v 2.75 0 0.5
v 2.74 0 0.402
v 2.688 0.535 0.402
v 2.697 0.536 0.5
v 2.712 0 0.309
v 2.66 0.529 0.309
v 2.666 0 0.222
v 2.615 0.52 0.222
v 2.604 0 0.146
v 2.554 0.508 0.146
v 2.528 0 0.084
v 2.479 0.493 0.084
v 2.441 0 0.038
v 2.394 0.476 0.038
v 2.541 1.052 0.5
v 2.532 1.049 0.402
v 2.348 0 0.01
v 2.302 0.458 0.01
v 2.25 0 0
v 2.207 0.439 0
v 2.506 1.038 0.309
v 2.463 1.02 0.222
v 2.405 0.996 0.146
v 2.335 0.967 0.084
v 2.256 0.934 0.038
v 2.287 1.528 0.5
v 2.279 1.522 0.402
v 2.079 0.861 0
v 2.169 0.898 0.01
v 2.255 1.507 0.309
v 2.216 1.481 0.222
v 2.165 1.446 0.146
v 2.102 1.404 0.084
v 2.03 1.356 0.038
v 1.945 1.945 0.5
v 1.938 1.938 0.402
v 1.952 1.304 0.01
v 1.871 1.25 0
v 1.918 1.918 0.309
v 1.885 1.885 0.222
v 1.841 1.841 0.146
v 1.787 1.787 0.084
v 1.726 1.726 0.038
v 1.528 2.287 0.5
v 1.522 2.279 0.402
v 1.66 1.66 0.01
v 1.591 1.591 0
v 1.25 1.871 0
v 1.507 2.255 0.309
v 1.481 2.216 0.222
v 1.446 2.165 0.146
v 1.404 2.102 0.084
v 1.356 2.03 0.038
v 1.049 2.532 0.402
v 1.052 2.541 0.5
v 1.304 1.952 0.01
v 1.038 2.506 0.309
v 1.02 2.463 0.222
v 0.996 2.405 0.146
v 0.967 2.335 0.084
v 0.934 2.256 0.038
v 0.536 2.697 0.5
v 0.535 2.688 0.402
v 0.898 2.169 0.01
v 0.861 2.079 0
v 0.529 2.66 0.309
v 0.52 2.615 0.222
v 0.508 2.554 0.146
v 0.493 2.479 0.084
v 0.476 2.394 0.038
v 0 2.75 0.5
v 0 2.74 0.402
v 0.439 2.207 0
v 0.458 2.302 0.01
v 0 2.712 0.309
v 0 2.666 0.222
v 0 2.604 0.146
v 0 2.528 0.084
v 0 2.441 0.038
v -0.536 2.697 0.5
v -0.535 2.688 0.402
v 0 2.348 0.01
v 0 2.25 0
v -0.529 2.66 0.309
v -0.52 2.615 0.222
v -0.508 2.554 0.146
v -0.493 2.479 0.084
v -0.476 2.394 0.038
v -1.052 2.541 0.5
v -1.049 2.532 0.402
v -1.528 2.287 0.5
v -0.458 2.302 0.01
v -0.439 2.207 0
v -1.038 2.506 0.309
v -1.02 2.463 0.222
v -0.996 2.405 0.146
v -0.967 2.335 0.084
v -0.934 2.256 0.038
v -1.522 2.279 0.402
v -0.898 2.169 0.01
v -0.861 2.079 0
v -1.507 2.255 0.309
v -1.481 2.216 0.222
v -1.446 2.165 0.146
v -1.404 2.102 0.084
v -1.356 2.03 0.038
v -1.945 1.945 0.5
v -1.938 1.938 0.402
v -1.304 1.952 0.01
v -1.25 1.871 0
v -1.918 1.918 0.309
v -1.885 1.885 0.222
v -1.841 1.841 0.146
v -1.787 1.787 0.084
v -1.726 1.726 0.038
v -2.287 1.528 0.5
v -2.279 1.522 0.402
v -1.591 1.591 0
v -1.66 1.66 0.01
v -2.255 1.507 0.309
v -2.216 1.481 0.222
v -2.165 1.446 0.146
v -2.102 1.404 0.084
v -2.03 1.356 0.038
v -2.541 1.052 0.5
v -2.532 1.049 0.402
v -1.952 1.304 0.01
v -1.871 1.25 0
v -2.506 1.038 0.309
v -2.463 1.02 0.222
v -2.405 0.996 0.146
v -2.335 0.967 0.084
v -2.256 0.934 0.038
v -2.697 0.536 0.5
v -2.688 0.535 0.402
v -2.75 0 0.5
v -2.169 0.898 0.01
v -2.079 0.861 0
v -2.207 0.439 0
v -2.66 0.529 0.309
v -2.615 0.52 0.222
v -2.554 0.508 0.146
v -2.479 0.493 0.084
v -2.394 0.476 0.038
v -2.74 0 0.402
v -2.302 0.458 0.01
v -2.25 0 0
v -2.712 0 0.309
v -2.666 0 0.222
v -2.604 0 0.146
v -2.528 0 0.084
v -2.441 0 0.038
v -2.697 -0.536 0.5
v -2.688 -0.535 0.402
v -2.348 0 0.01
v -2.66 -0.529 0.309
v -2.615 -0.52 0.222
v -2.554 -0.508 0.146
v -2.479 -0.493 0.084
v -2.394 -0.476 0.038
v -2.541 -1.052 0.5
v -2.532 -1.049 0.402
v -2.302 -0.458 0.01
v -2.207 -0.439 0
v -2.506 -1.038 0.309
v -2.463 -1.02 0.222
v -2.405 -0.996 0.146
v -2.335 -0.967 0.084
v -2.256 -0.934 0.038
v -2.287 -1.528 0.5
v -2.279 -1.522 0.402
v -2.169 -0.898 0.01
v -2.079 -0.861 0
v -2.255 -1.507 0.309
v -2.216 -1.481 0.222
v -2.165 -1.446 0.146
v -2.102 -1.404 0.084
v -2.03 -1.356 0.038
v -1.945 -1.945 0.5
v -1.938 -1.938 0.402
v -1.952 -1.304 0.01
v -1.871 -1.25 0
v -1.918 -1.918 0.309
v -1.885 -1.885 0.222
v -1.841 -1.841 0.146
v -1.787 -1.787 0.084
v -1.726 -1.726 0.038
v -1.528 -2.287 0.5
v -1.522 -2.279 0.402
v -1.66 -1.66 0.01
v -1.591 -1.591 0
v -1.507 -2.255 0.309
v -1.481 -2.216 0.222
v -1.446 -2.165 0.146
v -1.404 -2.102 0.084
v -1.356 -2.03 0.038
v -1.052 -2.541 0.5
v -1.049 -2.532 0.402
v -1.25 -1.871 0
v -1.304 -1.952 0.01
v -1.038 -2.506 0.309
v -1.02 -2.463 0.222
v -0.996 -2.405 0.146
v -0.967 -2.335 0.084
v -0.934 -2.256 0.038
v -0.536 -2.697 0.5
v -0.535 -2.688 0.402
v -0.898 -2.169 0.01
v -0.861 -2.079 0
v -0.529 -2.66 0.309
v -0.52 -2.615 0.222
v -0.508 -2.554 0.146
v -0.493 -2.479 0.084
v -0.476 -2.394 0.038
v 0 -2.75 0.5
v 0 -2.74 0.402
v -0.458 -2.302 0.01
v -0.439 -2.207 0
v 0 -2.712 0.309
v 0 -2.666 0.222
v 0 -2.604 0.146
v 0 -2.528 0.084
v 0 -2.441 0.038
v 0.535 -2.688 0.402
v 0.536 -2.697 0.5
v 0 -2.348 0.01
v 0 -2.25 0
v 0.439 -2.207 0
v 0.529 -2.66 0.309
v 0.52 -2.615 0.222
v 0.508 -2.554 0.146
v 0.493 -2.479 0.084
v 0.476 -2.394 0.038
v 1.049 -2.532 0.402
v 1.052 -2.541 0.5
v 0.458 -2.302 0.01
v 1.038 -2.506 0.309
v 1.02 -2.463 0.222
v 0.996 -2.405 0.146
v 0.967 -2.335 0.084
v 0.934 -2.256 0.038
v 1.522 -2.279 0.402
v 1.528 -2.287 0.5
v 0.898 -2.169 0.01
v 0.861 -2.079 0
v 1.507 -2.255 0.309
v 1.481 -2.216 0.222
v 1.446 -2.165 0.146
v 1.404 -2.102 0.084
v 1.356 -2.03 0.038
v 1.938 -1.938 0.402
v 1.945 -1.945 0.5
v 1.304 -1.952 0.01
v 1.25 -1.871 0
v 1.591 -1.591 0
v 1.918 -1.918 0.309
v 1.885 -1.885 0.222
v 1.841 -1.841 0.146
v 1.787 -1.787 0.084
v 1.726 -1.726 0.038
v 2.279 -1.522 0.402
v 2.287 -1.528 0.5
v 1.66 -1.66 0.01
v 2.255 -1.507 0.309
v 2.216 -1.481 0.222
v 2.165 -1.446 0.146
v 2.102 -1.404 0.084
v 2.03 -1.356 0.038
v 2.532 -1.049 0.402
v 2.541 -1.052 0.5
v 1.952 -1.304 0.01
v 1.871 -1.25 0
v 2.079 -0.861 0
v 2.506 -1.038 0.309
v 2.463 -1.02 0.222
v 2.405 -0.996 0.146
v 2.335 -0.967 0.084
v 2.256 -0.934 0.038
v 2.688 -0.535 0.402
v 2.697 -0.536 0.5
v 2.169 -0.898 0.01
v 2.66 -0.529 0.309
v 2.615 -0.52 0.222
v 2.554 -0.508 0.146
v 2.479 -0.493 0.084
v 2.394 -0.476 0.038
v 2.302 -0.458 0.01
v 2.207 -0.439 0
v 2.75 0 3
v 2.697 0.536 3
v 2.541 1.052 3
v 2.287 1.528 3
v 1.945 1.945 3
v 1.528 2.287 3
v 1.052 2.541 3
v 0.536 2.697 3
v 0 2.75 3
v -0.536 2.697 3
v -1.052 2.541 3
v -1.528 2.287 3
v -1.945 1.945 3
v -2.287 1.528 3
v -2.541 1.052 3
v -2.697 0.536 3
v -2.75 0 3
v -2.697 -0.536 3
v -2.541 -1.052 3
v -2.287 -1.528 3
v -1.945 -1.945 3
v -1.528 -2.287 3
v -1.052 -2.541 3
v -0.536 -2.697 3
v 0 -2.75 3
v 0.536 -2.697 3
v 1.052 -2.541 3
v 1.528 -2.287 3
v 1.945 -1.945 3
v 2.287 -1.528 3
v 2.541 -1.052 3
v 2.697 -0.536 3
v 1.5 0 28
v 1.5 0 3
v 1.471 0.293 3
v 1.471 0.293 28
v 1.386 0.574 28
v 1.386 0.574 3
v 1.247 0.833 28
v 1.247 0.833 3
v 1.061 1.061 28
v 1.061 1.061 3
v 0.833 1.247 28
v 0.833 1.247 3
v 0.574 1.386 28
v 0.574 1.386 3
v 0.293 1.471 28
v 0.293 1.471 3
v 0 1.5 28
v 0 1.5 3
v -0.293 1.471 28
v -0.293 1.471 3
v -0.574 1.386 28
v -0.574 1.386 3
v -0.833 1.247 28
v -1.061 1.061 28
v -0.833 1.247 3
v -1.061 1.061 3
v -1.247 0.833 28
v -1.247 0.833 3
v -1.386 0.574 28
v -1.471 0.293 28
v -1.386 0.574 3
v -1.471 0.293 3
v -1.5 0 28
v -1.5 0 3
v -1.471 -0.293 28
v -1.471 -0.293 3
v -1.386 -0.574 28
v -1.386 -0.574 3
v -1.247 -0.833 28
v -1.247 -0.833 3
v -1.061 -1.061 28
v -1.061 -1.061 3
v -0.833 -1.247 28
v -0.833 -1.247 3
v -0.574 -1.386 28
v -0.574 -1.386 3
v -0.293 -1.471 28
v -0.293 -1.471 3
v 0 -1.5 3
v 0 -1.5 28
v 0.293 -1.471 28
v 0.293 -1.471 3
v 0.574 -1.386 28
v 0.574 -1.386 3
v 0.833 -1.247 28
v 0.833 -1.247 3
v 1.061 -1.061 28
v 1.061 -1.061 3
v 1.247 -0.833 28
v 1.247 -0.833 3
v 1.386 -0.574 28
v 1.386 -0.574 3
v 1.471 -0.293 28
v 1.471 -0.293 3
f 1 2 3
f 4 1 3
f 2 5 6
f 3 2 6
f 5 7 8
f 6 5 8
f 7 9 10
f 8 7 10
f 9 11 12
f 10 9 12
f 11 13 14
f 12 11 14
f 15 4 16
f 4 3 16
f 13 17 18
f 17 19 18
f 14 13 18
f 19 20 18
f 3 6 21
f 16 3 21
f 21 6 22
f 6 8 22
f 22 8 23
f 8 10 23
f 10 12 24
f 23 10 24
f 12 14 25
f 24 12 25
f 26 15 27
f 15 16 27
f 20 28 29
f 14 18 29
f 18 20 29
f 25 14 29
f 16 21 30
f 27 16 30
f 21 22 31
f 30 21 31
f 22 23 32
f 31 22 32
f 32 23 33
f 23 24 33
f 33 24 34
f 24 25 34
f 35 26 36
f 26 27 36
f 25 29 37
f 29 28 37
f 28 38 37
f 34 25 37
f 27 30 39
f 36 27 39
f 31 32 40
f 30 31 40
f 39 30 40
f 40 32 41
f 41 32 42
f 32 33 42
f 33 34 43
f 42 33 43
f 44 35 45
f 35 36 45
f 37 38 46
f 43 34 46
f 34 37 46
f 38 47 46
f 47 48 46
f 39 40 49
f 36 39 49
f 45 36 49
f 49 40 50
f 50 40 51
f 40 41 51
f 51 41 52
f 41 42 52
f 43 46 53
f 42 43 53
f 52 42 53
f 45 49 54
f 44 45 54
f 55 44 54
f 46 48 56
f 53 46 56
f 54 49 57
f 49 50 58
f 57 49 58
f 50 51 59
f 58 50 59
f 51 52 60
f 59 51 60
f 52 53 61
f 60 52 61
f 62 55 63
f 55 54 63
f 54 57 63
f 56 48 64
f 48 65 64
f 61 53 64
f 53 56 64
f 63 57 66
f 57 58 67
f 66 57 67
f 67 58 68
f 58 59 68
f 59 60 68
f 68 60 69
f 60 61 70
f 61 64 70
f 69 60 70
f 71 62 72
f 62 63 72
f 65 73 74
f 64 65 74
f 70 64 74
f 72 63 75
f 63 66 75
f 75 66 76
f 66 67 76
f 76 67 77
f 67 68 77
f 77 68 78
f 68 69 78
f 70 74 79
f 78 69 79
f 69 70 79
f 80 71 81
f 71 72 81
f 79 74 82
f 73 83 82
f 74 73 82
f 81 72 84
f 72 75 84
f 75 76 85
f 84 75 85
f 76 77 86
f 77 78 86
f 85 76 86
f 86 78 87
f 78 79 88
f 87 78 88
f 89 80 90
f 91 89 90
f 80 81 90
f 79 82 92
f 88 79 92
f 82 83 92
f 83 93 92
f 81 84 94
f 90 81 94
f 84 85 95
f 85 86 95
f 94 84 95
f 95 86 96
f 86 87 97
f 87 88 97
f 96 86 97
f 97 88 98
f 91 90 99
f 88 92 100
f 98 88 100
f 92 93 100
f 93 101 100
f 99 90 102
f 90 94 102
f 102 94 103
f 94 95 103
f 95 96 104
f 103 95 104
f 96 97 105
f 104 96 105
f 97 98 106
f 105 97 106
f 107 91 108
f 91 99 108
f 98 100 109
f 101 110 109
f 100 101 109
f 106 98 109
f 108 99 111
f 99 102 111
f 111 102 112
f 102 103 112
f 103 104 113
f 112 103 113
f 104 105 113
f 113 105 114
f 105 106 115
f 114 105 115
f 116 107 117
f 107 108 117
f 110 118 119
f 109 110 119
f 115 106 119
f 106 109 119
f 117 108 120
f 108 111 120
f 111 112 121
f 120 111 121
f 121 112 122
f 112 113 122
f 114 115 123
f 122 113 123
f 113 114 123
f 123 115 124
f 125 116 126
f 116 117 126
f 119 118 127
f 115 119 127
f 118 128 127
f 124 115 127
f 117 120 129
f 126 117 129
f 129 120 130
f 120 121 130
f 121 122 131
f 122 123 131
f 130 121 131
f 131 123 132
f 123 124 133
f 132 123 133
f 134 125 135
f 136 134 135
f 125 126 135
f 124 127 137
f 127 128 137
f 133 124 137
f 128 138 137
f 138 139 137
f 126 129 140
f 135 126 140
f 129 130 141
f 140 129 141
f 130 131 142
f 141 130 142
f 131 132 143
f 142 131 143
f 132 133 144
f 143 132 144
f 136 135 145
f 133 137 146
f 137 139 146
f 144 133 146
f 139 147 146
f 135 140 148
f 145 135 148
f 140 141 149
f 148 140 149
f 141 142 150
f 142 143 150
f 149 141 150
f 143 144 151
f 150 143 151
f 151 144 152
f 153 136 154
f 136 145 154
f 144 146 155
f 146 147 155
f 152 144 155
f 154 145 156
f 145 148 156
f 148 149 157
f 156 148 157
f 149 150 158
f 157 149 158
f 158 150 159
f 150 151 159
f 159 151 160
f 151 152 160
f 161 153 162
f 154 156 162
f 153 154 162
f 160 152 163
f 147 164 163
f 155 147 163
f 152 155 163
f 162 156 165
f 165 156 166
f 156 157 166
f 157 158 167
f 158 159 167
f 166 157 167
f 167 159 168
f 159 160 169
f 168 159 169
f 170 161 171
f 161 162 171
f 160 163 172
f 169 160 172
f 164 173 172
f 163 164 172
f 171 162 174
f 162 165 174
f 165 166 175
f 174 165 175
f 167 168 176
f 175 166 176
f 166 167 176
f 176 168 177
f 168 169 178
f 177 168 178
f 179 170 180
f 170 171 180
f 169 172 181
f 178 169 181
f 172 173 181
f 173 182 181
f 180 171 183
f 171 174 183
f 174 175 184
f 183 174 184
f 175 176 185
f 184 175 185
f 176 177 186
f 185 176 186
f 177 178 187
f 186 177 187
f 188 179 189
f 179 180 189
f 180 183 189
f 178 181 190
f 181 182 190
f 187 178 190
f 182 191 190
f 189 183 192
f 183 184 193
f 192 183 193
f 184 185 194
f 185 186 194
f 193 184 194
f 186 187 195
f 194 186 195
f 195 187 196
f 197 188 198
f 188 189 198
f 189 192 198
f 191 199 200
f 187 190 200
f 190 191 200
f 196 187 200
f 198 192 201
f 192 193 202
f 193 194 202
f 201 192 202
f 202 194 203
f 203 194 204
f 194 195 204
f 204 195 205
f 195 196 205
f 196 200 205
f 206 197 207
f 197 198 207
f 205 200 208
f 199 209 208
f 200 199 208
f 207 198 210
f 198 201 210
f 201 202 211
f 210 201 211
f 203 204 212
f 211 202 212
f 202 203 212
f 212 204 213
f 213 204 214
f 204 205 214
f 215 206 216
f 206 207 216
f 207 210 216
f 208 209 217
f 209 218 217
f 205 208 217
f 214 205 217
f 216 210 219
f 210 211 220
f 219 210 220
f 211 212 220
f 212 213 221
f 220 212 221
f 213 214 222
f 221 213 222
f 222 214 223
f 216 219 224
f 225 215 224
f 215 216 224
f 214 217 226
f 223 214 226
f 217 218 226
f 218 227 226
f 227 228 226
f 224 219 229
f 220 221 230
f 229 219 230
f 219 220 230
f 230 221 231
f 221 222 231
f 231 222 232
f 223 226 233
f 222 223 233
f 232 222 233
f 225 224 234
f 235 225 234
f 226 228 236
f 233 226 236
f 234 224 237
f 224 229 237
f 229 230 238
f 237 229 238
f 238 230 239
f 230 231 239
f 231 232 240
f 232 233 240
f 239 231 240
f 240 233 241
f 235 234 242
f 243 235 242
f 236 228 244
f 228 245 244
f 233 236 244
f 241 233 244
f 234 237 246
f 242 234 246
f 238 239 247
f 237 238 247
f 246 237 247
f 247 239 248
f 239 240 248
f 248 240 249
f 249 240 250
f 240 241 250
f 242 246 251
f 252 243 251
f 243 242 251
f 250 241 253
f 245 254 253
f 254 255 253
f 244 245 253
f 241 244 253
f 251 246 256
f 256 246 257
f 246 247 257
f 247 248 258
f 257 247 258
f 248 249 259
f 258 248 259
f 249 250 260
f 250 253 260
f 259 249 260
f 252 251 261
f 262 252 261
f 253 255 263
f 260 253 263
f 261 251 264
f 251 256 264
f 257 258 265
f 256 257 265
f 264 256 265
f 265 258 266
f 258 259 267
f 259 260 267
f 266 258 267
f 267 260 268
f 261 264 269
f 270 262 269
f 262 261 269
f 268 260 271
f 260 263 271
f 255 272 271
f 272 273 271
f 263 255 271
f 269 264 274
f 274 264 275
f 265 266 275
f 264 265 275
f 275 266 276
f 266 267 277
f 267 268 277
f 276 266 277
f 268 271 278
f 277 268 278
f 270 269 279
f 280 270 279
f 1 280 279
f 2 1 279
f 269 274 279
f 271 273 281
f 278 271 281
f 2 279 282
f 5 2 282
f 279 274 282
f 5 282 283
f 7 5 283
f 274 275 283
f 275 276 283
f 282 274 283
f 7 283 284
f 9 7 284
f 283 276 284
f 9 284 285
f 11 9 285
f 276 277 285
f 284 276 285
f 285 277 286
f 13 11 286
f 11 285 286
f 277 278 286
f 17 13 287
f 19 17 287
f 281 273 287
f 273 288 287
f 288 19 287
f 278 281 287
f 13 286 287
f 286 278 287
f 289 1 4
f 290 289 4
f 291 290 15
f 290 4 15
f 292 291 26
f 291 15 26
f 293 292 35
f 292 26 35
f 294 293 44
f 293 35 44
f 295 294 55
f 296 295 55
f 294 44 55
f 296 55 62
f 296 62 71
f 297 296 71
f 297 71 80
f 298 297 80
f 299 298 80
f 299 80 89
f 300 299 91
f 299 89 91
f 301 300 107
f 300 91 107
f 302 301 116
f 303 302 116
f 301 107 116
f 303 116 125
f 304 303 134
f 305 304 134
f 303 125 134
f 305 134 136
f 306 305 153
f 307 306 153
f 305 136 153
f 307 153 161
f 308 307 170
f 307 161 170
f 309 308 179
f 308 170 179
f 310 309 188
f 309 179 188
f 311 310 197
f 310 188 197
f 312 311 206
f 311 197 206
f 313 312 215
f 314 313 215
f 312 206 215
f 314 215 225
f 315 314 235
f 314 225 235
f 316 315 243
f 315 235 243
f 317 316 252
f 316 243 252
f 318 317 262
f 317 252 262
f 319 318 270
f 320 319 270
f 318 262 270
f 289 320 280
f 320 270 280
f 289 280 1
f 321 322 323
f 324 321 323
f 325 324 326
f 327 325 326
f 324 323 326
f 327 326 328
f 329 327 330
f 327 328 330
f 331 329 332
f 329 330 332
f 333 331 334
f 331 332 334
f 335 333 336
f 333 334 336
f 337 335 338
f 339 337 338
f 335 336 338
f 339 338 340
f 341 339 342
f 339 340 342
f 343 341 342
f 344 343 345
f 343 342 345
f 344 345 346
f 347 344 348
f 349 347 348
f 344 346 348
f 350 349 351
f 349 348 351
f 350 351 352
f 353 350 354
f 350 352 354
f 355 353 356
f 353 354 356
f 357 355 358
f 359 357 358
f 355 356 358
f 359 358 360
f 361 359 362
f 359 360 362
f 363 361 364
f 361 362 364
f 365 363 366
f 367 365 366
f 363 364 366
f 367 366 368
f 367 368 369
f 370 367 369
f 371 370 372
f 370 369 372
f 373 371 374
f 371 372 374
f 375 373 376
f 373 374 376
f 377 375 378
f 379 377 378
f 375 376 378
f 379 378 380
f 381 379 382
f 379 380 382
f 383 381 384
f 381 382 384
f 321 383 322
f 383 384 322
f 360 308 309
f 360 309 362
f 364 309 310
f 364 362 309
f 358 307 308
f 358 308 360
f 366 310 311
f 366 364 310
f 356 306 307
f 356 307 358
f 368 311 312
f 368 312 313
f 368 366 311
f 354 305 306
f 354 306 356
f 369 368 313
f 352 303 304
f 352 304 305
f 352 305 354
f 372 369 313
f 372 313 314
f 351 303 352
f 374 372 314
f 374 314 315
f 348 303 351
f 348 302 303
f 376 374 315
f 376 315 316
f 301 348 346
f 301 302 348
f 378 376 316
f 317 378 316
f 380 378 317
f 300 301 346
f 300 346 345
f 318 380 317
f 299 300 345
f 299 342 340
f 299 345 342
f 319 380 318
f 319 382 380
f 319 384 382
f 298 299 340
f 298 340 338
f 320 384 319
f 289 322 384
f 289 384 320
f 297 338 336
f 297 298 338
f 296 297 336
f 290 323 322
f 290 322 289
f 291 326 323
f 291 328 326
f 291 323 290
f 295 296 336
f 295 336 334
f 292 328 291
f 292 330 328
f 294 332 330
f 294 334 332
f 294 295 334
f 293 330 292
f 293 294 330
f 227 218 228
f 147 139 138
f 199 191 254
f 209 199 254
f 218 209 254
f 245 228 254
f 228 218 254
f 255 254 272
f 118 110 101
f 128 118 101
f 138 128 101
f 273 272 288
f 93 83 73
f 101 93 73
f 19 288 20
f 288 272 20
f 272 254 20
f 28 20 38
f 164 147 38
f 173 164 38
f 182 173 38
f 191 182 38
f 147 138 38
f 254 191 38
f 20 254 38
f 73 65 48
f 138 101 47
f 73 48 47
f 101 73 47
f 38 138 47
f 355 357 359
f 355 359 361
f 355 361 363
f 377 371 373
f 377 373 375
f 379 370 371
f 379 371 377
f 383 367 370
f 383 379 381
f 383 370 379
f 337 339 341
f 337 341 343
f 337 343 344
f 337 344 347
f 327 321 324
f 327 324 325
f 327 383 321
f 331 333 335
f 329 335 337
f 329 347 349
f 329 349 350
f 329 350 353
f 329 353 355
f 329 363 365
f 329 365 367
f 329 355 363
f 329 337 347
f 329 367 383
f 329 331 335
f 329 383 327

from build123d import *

# Parameters (mm, degrees)
SKETCH_2_R      = 2.75
EXTRUDE_1_DEPTH = 3
SKETCH_3_R      = 1.5
EXTRUDE_2_DEPTH = 25
FILLET_1_R      = 0.5


with BuildPart() as part:
    # ｽｹｯﾁ2 → ﾎﾞｽ - 押し出し1 (new body)
    with BuildSketch(Plane.XY):
        Circle(SKETCH_2_R)
    extrude(amount=EXTRUDE_1_DEPTH)

    # ｽｹｯﾁ3 → ﾎﾞｽ - 押し出し2 (add)
    with BuildSketch(Plane.XY.offset(3)):
        Circle(SKETCH_3_R)
    extrude(amount=EXTRUDE_2_DEPTH)

    # ﾌｨﾚｯﾄ1
    fillet_1_edges = [part.edges().sort_by_distance(p)[0] for p in [
        (-2.75, 0, 0),
    ]]
    fillet(fillet_1_edges, radius=FILLET_1_R)


solid = part.part
